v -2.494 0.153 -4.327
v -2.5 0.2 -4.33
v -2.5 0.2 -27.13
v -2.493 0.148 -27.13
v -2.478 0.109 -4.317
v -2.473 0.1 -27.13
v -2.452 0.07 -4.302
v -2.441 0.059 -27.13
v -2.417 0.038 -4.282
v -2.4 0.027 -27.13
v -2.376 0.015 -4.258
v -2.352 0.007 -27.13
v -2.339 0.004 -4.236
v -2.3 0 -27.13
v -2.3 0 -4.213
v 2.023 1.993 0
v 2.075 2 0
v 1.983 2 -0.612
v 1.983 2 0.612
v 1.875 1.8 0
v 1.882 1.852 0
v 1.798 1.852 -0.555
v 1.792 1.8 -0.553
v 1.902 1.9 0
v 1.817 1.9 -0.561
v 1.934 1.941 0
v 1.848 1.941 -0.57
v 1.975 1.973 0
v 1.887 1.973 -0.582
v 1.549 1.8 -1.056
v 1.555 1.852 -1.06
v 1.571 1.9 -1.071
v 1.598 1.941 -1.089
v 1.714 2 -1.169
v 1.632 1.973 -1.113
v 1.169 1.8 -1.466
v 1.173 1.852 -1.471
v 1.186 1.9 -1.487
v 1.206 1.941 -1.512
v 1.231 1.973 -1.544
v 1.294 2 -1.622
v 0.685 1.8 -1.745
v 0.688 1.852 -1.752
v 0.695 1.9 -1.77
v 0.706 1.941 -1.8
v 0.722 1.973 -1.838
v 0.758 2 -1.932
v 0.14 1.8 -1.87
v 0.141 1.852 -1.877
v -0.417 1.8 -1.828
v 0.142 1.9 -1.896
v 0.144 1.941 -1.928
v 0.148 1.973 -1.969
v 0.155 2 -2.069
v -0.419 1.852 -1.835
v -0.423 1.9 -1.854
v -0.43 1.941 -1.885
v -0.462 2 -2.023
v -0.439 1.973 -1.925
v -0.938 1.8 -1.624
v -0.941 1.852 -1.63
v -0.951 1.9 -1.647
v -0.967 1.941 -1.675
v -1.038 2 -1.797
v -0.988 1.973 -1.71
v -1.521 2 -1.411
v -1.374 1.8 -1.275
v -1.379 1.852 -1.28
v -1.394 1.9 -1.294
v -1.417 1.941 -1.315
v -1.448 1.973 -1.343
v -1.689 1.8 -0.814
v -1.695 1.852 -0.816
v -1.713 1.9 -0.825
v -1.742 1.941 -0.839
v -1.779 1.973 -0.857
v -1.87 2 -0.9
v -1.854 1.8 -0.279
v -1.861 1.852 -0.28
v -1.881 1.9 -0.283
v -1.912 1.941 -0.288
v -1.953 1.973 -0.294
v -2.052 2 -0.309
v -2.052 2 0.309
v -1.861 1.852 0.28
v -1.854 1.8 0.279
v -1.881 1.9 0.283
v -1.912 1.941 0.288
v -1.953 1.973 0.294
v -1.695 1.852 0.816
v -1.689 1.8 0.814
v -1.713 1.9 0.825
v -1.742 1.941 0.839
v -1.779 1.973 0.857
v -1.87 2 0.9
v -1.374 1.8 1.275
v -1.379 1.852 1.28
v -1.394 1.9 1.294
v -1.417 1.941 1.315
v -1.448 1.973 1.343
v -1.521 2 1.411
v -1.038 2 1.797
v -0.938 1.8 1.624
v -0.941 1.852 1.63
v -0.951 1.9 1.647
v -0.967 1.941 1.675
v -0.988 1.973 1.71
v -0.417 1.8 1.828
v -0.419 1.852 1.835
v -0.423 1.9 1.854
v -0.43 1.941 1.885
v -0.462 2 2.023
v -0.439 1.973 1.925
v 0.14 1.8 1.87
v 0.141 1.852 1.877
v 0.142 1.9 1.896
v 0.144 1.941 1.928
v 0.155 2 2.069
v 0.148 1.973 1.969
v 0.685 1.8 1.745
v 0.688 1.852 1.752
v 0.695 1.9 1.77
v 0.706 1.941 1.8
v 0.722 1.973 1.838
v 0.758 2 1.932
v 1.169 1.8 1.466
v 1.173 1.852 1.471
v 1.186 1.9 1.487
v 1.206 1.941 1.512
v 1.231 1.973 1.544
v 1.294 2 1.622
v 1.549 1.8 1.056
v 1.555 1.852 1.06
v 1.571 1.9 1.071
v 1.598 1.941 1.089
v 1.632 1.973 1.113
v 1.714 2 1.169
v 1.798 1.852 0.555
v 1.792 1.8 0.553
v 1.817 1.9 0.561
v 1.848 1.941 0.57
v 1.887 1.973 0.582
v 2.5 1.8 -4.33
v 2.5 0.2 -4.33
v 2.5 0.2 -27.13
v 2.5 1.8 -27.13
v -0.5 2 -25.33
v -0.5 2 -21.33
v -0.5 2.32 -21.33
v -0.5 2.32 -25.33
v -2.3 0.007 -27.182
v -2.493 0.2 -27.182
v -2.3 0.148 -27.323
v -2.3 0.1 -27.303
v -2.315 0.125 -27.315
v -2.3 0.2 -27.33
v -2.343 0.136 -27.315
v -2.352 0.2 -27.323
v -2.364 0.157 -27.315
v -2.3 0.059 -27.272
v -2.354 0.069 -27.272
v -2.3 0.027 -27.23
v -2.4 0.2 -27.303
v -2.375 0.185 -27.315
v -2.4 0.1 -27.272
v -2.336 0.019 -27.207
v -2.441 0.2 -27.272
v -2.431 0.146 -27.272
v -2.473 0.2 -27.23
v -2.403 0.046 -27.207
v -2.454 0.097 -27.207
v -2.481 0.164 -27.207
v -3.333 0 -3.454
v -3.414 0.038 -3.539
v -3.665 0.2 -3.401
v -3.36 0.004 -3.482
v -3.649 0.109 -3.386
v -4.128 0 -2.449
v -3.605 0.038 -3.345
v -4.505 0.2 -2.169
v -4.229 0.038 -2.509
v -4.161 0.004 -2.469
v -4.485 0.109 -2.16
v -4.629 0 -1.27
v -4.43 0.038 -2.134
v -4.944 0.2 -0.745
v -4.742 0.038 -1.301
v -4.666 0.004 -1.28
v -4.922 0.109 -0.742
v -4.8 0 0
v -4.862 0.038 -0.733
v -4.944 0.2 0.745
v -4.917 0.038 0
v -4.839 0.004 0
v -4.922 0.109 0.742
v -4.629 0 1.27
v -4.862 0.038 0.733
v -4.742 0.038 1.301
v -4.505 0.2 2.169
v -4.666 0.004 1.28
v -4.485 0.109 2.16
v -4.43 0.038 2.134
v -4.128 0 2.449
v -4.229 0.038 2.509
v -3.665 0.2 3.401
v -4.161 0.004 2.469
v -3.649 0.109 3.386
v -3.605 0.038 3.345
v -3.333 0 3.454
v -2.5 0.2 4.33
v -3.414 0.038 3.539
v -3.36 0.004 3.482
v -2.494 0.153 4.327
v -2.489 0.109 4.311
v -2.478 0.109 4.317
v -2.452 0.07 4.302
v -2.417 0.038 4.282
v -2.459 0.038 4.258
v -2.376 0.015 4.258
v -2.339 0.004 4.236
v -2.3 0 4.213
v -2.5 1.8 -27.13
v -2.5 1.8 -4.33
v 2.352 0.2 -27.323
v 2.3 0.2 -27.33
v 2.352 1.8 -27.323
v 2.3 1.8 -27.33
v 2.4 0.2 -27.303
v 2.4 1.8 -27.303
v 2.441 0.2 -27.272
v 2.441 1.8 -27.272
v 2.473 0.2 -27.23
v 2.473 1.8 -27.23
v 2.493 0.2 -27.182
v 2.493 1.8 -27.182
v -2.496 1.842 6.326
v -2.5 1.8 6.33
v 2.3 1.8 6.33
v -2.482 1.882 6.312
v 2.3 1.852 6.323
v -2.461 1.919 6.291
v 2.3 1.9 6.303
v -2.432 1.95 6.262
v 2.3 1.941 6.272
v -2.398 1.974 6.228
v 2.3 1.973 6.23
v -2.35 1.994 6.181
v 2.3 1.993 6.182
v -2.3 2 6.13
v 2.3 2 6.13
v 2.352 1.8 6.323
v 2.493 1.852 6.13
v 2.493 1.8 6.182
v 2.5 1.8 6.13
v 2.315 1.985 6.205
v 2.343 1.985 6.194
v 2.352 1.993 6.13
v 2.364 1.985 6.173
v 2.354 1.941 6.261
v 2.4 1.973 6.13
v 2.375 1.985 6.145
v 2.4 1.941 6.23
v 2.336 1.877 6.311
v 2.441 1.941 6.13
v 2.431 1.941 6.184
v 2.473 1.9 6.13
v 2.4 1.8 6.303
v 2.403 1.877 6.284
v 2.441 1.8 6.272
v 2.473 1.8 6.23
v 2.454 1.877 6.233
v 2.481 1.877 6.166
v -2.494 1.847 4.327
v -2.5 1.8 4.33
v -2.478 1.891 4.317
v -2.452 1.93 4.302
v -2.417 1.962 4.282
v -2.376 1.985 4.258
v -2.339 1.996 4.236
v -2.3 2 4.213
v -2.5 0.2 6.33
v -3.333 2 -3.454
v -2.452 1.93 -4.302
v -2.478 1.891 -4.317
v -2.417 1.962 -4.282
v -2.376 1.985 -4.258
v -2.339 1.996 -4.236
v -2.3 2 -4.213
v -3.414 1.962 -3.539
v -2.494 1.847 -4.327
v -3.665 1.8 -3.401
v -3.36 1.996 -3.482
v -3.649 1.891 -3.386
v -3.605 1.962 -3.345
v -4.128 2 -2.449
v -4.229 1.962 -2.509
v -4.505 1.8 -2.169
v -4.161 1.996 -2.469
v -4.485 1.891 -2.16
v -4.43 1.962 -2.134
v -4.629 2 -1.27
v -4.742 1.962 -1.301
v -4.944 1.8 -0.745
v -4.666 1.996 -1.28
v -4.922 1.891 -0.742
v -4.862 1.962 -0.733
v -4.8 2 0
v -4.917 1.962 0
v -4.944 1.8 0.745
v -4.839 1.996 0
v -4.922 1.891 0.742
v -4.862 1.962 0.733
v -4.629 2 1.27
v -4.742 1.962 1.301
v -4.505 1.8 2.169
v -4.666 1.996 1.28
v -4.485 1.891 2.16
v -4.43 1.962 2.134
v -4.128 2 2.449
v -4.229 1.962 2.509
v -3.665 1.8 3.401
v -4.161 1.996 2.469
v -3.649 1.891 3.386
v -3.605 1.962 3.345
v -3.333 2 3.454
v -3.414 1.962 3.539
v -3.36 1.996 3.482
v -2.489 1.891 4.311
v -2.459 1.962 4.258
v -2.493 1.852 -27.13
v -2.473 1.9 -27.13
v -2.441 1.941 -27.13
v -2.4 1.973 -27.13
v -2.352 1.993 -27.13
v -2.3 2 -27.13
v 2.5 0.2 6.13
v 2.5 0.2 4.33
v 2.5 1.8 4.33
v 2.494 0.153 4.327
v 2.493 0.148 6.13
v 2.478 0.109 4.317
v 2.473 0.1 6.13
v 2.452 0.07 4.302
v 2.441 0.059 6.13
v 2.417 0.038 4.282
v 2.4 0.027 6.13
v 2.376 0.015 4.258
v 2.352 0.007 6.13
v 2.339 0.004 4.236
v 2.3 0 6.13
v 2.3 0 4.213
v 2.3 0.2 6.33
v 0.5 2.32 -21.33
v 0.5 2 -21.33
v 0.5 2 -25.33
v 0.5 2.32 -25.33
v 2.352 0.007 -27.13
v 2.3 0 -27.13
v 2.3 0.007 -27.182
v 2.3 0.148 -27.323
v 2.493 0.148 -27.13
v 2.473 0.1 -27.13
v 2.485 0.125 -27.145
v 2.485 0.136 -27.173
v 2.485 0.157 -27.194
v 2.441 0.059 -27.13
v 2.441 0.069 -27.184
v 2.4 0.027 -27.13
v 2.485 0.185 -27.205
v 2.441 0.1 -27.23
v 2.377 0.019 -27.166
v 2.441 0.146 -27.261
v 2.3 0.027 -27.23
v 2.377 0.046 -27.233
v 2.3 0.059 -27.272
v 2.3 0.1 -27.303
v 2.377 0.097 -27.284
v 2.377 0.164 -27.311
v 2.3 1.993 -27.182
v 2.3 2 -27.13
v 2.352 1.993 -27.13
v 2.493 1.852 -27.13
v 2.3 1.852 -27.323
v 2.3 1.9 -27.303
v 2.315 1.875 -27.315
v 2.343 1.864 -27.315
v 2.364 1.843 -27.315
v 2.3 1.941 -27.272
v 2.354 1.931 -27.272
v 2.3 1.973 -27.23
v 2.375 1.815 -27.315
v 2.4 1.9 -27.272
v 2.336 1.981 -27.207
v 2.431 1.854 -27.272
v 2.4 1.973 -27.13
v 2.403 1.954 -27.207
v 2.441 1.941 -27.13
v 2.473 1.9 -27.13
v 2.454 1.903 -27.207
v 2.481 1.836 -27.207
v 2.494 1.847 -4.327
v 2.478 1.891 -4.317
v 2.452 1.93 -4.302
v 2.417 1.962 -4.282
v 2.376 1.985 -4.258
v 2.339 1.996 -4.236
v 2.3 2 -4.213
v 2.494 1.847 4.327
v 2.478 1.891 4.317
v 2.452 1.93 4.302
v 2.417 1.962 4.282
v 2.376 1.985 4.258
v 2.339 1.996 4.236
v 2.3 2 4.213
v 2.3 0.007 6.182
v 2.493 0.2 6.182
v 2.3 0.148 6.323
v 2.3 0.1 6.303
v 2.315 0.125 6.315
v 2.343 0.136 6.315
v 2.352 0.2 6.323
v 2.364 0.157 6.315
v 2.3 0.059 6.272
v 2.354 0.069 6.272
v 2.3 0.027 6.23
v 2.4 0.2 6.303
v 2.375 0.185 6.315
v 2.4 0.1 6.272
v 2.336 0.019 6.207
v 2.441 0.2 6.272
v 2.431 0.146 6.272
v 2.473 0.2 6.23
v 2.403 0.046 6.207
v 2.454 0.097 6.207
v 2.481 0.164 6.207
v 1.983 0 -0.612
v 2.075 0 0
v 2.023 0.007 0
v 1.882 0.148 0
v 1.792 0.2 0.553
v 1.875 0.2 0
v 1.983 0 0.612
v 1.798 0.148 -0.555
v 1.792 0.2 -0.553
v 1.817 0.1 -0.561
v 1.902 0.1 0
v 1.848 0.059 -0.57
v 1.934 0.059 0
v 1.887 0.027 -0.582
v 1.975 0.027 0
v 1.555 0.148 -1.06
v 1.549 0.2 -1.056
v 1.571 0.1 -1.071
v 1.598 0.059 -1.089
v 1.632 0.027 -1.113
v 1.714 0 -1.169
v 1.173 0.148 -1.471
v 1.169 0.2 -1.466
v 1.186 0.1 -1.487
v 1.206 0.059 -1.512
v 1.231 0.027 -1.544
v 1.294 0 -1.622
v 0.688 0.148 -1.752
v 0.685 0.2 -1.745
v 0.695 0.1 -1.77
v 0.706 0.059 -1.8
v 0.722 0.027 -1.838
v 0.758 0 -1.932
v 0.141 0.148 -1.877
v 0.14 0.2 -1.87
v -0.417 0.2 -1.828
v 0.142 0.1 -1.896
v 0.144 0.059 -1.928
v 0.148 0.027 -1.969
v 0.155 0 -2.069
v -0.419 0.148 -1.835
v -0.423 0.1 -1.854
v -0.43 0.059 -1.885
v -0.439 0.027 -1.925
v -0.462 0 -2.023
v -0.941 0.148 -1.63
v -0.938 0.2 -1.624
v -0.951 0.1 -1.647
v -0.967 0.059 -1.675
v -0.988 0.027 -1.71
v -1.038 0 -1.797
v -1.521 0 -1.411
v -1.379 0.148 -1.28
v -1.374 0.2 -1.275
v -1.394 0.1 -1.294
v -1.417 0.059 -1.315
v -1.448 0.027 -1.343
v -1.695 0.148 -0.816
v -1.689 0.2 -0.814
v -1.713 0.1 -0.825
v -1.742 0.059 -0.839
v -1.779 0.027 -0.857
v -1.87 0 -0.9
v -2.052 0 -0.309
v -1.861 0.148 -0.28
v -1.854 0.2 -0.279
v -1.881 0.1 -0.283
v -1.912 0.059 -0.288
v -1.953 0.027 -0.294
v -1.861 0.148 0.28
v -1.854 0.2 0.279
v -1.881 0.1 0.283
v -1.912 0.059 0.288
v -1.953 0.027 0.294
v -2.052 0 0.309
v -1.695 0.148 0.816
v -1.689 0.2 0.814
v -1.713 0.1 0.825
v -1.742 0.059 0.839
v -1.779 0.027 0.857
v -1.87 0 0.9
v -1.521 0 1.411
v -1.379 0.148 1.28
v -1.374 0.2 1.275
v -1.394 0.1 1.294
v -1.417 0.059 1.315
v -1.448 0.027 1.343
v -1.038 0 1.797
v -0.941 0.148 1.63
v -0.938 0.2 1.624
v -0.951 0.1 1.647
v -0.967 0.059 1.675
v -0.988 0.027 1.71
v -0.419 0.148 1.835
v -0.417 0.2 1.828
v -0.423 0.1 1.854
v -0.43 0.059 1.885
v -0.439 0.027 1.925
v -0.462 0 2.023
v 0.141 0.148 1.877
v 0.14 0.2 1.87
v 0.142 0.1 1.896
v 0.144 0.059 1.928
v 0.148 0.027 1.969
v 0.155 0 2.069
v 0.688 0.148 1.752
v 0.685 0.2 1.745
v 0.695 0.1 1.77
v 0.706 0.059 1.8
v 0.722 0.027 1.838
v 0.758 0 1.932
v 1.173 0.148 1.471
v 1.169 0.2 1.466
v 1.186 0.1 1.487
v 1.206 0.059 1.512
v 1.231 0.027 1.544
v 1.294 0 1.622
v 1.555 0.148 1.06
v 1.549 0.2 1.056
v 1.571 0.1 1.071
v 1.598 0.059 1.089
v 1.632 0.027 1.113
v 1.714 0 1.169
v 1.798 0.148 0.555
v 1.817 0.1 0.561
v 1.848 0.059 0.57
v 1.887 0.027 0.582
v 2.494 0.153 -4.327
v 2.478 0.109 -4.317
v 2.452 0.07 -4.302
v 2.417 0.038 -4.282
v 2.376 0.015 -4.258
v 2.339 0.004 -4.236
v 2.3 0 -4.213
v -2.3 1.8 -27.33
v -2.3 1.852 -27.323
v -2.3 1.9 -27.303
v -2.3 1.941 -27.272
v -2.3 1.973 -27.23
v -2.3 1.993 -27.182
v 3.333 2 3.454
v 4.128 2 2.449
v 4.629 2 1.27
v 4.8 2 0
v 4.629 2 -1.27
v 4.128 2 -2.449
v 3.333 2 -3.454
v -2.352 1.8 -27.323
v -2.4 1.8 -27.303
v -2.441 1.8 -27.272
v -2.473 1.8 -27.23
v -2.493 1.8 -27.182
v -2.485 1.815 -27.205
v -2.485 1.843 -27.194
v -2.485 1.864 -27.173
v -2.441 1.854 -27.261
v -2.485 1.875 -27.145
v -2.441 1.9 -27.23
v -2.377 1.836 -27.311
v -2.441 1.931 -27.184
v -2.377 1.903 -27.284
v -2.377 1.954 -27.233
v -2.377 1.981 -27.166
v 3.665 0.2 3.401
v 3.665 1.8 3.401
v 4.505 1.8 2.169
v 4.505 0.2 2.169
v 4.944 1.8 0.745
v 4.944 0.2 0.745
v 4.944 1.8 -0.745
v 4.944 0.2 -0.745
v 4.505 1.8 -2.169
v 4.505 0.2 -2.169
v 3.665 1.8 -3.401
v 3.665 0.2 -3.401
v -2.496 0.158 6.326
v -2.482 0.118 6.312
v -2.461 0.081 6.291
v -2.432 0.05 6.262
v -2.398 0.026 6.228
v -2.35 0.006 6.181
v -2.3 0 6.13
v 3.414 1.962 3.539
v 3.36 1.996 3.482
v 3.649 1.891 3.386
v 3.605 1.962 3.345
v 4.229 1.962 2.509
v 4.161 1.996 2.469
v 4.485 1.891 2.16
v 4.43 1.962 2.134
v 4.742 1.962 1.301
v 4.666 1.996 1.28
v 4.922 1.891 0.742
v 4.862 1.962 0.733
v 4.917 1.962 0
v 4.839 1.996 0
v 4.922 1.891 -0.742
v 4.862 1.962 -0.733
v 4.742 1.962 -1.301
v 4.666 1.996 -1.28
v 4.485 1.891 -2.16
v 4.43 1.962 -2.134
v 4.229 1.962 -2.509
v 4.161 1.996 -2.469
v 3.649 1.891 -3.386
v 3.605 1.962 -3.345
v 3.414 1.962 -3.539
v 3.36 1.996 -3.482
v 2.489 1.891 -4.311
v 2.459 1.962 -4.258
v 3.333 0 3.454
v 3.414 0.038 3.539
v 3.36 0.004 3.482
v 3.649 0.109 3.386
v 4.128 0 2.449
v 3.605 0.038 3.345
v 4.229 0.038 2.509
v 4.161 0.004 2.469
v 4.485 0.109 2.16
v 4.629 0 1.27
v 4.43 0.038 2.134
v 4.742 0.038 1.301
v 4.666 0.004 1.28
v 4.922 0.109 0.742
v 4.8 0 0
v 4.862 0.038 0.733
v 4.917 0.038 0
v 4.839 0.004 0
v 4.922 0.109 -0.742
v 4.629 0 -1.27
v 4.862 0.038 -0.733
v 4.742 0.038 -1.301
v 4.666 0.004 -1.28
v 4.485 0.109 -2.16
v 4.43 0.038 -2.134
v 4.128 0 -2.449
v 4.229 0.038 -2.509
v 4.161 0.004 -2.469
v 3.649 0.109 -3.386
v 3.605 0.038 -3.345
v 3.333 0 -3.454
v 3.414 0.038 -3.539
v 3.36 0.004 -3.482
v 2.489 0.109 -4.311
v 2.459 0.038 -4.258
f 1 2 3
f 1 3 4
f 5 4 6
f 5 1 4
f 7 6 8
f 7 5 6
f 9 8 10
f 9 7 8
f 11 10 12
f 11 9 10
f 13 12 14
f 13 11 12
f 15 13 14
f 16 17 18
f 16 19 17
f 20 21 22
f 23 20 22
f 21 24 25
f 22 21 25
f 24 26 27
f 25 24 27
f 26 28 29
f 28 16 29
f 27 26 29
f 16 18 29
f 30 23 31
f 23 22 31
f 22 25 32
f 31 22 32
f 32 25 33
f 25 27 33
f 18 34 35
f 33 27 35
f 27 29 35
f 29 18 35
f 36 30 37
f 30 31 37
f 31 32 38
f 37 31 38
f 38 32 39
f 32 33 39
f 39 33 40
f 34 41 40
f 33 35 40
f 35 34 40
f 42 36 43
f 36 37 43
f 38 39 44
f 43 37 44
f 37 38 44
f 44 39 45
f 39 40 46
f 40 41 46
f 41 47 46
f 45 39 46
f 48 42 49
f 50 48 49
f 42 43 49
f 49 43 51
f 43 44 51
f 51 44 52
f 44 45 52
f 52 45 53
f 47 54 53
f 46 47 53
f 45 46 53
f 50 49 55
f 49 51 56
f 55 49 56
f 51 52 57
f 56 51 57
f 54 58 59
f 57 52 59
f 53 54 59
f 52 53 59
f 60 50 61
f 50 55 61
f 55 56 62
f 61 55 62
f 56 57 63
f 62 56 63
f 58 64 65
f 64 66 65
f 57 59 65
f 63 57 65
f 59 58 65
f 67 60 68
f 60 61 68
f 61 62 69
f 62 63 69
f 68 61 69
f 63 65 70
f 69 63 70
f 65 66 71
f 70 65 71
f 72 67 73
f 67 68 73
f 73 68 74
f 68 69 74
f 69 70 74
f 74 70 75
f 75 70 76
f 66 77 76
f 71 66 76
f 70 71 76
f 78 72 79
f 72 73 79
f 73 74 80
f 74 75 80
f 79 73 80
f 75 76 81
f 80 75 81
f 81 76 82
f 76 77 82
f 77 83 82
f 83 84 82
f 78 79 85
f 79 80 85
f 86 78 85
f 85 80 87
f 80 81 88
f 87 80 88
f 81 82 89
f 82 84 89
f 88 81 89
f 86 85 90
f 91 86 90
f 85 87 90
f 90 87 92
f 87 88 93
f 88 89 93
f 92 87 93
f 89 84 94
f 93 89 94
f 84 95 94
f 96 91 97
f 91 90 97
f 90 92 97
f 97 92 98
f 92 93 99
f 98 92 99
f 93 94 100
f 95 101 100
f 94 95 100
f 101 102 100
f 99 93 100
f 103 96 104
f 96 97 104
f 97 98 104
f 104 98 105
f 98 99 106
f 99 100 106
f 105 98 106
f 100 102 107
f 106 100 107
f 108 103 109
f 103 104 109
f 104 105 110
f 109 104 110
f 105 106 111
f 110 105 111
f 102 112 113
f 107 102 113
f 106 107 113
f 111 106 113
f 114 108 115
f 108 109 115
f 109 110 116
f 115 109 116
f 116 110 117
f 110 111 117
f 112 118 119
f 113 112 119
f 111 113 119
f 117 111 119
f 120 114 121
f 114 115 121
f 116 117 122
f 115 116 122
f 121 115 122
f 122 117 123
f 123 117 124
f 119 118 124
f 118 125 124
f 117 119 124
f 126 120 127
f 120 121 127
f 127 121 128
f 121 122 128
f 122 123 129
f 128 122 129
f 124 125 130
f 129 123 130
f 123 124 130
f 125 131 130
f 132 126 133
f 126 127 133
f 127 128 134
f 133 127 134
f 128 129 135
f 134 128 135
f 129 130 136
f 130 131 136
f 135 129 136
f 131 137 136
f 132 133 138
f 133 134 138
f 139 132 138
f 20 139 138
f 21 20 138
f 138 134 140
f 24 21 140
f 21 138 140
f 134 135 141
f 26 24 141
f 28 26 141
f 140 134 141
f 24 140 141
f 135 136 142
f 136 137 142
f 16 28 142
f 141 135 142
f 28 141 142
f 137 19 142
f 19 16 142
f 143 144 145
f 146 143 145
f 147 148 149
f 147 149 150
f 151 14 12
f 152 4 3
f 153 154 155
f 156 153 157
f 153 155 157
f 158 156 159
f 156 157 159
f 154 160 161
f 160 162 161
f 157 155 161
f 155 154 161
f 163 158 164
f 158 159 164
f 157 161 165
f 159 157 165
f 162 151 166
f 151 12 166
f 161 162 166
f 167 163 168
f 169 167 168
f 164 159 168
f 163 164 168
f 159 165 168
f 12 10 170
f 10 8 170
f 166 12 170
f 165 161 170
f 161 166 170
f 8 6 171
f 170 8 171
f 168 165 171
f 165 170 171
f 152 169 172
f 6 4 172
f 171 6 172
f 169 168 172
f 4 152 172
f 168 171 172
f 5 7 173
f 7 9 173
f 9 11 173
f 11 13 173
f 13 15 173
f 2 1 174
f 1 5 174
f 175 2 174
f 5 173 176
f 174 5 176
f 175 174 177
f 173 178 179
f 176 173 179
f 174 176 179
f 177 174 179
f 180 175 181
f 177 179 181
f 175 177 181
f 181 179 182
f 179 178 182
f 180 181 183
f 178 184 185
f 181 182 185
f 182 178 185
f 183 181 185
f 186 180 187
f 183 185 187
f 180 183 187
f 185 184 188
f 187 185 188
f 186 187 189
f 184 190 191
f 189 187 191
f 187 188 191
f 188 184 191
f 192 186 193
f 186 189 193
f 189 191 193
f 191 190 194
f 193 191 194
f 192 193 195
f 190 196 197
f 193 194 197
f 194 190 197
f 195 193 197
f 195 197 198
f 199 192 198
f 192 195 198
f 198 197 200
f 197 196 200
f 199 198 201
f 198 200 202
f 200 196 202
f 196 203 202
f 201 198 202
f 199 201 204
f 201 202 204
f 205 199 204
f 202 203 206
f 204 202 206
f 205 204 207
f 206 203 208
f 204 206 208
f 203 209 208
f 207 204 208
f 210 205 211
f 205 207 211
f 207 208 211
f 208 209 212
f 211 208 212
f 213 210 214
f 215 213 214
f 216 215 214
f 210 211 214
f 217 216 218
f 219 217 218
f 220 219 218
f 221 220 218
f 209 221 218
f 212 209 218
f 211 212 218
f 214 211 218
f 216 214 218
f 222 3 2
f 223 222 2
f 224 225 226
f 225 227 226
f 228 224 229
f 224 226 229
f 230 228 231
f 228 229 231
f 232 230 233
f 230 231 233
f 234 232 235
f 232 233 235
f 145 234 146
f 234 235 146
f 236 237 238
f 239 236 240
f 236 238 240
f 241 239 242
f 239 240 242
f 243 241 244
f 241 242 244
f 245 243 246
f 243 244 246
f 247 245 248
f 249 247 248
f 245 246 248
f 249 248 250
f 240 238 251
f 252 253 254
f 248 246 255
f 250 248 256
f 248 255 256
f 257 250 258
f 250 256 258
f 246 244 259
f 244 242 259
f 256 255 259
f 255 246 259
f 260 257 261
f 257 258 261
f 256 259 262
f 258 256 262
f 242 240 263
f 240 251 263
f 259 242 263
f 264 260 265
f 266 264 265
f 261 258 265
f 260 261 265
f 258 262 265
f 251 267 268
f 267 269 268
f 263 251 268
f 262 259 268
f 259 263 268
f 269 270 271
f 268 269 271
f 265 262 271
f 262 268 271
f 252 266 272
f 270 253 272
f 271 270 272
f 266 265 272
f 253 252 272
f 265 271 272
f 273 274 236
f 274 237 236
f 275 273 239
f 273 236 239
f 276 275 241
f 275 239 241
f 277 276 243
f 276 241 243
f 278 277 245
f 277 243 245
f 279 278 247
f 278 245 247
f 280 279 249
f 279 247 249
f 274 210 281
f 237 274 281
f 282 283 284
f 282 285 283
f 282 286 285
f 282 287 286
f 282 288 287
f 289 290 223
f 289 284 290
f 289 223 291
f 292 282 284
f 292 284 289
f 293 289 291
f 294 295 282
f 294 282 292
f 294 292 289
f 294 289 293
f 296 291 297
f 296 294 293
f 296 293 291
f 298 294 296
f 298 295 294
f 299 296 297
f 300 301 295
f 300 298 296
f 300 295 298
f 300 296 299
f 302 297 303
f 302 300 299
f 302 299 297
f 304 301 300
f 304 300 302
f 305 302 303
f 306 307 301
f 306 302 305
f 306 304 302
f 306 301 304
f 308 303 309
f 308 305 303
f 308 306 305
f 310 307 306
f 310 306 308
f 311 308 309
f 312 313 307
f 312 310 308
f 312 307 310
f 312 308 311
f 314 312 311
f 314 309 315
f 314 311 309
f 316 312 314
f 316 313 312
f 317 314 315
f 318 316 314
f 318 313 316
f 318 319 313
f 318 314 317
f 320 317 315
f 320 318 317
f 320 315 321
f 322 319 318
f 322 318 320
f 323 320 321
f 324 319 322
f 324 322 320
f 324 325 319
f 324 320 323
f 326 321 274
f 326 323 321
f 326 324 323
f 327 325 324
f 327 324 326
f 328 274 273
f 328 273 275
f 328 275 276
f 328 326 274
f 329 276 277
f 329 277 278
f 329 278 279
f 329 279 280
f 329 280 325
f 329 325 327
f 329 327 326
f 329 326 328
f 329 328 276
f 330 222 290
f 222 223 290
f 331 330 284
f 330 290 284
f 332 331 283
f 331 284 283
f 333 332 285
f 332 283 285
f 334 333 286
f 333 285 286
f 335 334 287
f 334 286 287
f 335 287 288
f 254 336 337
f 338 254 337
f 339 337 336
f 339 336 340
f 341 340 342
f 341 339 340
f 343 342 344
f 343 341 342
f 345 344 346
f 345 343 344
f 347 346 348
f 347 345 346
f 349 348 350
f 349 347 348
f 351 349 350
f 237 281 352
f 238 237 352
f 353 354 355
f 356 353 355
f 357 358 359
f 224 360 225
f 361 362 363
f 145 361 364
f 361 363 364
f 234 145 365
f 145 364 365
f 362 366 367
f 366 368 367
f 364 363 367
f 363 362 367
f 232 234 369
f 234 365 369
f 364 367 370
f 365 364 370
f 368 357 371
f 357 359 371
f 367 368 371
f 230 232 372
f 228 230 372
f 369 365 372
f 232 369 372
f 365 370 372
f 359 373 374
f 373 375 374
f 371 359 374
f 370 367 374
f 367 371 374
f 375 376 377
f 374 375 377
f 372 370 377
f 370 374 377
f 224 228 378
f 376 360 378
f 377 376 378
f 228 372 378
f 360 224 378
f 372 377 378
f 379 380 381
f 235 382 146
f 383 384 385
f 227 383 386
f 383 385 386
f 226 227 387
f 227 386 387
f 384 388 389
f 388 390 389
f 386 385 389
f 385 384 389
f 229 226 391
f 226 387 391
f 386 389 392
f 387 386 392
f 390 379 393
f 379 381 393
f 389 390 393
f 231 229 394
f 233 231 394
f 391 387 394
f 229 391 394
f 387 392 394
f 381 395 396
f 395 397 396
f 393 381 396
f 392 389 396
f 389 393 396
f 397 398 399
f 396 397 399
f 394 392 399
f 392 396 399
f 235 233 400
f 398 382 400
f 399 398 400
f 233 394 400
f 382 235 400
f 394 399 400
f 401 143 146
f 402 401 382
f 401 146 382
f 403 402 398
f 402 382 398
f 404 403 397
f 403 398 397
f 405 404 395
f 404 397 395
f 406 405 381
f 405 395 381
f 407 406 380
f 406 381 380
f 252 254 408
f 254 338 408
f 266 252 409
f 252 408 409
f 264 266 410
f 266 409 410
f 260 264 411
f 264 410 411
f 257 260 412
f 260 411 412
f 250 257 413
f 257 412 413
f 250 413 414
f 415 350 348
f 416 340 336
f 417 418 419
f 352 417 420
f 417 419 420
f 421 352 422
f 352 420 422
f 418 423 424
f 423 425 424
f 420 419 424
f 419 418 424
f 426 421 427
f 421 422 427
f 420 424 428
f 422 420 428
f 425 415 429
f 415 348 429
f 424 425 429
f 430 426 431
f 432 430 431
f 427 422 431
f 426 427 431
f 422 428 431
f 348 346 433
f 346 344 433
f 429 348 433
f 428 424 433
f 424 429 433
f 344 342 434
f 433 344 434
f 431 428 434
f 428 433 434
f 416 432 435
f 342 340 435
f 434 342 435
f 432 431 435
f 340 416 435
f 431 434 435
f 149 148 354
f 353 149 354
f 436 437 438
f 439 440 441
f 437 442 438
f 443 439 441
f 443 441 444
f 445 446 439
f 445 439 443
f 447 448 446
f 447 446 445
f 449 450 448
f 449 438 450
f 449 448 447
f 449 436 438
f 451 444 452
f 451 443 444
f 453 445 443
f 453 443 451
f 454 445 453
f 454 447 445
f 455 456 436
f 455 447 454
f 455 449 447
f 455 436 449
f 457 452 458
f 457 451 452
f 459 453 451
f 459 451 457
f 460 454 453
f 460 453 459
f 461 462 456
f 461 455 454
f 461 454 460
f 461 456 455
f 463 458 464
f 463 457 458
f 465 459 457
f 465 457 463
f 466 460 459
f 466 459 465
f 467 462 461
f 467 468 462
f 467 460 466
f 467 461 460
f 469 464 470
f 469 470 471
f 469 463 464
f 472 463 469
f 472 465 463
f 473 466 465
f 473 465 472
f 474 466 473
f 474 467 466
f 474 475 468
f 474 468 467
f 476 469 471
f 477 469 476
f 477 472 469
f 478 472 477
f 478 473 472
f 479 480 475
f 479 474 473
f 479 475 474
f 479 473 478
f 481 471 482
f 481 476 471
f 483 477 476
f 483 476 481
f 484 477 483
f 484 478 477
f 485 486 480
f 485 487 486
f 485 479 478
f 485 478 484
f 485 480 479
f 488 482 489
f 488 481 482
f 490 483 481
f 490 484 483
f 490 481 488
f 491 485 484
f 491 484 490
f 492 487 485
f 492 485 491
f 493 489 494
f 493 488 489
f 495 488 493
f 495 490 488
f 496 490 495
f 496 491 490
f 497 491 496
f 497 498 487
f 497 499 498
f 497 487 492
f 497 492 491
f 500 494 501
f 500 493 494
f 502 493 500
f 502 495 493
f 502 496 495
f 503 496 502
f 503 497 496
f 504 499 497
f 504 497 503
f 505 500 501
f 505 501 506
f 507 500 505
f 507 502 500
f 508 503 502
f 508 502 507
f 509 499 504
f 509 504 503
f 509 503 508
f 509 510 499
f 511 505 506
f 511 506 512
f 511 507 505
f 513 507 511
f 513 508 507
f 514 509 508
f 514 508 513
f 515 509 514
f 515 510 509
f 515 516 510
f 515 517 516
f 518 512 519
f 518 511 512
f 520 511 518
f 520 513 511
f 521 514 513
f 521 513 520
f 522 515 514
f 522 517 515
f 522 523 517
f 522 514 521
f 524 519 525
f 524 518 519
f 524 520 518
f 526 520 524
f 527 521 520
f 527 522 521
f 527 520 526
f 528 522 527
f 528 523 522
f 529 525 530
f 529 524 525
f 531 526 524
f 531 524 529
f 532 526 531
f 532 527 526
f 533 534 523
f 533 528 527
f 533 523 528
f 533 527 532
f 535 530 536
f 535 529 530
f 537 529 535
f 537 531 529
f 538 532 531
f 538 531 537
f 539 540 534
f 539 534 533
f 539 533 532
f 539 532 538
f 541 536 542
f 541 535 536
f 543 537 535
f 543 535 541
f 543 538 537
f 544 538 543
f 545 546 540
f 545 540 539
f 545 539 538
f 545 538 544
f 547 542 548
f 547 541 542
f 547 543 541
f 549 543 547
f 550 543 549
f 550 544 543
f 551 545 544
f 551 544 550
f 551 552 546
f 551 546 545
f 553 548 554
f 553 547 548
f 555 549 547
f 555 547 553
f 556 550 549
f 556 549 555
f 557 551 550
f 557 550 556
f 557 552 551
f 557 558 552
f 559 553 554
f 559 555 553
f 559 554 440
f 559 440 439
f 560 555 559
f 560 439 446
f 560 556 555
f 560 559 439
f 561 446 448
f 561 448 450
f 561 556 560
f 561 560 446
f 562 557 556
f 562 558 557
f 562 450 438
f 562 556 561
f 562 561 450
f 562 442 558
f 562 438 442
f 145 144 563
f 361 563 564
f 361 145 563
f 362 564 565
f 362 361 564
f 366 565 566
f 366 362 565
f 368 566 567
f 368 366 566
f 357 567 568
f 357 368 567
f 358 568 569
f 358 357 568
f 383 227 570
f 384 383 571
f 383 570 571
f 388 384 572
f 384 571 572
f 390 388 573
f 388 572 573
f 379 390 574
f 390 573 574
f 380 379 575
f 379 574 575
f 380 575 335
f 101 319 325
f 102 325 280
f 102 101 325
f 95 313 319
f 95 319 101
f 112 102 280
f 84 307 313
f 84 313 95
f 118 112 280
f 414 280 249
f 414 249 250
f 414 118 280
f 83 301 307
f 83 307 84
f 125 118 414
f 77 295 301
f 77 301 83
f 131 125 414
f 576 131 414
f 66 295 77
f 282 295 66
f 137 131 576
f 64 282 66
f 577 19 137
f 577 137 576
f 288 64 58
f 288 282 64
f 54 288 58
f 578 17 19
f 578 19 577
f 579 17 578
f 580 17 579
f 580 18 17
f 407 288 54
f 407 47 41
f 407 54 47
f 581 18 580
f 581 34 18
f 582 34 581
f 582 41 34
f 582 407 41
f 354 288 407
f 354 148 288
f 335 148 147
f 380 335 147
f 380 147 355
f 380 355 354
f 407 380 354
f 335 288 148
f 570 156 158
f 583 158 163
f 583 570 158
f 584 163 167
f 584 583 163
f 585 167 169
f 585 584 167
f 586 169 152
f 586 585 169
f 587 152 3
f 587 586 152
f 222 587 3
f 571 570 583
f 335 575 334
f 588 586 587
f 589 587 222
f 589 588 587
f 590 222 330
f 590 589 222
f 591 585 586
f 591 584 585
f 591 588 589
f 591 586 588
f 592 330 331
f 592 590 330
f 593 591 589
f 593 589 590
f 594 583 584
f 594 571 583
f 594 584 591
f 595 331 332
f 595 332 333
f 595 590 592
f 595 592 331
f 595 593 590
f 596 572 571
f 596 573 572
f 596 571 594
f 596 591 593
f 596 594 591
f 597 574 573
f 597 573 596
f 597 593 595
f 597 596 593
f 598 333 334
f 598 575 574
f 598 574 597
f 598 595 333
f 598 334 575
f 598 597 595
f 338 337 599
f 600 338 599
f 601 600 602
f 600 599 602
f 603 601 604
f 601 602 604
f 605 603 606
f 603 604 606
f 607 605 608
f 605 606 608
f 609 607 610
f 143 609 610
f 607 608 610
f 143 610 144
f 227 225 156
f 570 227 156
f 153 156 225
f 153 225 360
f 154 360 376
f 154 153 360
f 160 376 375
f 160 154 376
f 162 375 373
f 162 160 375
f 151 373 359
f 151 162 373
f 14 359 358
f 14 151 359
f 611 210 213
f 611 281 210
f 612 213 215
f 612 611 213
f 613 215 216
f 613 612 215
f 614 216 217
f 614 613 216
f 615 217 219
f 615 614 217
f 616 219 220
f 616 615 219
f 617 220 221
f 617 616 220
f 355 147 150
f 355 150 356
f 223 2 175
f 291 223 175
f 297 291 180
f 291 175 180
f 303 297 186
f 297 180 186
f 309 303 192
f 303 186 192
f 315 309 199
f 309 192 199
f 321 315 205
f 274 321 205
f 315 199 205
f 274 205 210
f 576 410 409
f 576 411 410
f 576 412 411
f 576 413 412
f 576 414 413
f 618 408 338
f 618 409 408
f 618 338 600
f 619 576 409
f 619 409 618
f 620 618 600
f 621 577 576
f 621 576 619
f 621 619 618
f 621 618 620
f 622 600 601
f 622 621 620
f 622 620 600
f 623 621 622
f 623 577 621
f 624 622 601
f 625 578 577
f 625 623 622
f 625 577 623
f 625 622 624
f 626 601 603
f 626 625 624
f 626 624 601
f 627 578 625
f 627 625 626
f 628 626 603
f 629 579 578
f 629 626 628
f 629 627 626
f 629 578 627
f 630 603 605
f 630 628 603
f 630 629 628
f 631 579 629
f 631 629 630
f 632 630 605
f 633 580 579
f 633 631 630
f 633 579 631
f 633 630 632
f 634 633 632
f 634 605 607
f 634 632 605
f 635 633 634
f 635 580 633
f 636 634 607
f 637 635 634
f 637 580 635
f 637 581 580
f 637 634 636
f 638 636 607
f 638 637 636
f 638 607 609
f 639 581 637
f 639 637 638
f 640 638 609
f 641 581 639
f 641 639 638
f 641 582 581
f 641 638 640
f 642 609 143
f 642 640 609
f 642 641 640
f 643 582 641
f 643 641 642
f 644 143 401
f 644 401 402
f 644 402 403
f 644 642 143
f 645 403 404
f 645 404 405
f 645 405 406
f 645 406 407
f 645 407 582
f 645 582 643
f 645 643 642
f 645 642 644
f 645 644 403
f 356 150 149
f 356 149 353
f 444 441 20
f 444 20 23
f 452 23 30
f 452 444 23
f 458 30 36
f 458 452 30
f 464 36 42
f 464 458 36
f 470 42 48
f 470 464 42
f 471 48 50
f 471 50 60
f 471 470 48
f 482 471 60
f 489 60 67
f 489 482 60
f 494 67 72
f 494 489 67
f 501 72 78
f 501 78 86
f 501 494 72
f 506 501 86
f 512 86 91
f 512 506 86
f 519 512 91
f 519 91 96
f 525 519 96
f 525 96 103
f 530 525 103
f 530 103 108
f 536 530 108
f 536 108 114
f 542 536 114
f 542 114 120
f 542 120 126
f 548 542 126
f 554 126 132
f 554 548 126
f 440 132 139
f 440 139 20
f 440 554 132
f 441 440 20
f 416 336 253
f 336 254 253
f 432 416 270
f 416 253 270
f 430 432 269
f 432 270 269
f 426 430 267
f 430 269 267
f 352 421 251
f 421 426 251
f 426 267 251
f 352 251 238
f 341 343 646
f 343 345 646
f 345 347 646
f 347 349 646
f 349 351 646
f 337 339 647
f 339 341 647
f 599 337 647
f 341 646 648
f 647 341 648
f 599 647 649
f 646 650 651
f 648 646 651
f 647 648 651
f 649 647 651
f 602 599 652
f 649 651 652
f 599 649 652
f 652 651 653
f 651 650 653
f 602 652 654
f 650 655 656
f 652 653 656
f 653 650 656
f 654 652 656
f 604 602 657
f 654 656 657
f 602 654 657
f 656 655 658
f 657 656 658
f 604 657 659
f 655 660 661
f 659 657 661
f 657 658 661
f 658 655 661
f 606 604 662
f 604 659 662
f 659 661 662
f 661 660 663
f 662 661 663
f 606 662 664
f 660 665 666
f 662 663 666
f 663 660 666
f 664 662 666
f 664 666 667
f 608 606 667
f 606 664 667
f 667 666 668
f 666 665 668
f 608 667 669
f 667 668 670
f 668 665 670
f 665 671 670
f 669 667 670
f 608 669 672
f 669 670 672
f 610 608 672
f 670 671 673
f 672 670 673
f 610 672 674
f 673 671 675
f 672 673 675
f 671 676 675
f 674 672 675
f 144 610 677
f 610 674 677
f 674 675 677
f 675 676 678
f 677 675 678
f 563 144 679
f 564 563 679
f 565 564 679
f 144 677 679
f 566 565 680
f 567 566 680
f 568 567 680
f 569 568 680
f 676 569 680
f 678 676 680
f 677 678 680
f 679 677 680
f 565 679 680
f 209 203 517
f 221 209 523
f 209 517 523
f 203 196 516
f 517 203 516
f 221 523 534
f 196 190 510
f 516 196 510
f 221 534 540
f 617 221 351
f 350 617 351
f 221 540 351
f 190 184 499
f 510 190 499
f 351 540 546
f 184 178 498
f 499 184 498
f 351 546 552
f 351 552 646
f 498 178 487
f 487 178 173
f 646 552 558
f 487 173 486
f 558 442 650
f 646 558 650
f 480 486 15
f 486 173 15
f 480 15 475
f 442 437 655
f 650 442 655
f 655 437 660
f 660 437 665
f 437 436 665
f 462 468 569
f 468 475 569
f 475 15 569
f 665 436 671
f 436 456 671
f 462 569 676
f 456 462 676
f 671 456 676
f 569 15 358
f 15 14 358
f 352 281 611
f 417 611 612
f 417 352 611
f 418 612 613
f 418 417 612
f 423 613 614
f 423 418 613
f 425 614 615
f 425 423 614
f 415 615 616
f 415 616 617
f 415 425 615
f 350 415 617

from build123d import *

# Parameters (mm, degrees)
SKETCH_1_R      = 1.875
EXTRUDE_1_DEPTH = 2
FILLET_1_R      = 0.2
SKETCH_2_W      = 1
SKETCH_2_H      = 4
EXTRUDE_2_DEPTH = 0.32


with BuildPart() as part:
    # 草图1 → 凸台-拉伸1 (new body)
    with BuildSketch(Plane(origin=(0, 0, 0), x_dir=(1, 0, 0), z_dir=(0, 1, 0))):
        with BuildLine():
            Line((2.5, 27.330127019), (-2.5, 27.330127019))
            Line((-2.5, 27.330127019), (-2.5, 4.330127019))
            ThreePointArc((-2.5, 4.330127019), (-5, 0), (-2.5, -4.330127019))
            Line((-2.5, -4.330127019), (-2.5, -6.330127019))
            Line((-2.5, -6.330127019), (2.5, -6.330127019))
            Line((2.5, -6.330127019), (2.5, -4.330127019))
            ThreePointArc((2.5, -4.330127019), (5, 0), (2.5, 4.330127019))
            Line((2.5, 4.330127019), (2.5, 27.330127019))
        make_face()
        Circle(SKETCH_1_R, mode=Mode.SUBTRACT)
    extrude(amount=EXTRUDE_1_DEPTH)

    # 圆角1
    fillet_1_edges = [part.edges().sort_by_distance(p)[0] for p in [
        (-1.875, 0, 0),
        (2.5, 2, -15.830127019),
        (2.5, 0, 5.330127019),
        (0, 0, 6.330127019),
        (-2.5, 0, 5.330127019),
        (-5, 0, 0),
        (-2.5, 0, -15.830127019),
        (0, 0, -27.330127019),
        (2.5, 0, -15.830127019),
        (5, 0, 0),
        (0, 2, -27.330127019),
        (2.5, 1, 6.330127019),
        (-2.5, 1, -27.330127019),
        (2.5, 1, -27.330127019),
        (-2.5, 2, -15.830127019),
        (-5, 2, 0),
        (-2.5, 2, 5.330127019),
        (0, 2, 6.330127019),
        (2.5, 2, 5.330127019),
        (-1.875, 2, 0),
        (5, 2, 0),
    ]]
    fillet(fillet_1_edges, radius=FILLET_1_R)

    # 草图2 → 凸台-拉伸2 (add)
    with BuildSketch(Plane(origin=(0, 2, 0), x_dir=(1, 0, 0), z_dir=(0, 1, 0))):
        with Locations((0, 23.330127019)):
            Rectangle(SKETCH_2_W, SKETCH_2_H)
    extrude(amount=EXTRUDE_2_DEPTH)


solid = part.part
